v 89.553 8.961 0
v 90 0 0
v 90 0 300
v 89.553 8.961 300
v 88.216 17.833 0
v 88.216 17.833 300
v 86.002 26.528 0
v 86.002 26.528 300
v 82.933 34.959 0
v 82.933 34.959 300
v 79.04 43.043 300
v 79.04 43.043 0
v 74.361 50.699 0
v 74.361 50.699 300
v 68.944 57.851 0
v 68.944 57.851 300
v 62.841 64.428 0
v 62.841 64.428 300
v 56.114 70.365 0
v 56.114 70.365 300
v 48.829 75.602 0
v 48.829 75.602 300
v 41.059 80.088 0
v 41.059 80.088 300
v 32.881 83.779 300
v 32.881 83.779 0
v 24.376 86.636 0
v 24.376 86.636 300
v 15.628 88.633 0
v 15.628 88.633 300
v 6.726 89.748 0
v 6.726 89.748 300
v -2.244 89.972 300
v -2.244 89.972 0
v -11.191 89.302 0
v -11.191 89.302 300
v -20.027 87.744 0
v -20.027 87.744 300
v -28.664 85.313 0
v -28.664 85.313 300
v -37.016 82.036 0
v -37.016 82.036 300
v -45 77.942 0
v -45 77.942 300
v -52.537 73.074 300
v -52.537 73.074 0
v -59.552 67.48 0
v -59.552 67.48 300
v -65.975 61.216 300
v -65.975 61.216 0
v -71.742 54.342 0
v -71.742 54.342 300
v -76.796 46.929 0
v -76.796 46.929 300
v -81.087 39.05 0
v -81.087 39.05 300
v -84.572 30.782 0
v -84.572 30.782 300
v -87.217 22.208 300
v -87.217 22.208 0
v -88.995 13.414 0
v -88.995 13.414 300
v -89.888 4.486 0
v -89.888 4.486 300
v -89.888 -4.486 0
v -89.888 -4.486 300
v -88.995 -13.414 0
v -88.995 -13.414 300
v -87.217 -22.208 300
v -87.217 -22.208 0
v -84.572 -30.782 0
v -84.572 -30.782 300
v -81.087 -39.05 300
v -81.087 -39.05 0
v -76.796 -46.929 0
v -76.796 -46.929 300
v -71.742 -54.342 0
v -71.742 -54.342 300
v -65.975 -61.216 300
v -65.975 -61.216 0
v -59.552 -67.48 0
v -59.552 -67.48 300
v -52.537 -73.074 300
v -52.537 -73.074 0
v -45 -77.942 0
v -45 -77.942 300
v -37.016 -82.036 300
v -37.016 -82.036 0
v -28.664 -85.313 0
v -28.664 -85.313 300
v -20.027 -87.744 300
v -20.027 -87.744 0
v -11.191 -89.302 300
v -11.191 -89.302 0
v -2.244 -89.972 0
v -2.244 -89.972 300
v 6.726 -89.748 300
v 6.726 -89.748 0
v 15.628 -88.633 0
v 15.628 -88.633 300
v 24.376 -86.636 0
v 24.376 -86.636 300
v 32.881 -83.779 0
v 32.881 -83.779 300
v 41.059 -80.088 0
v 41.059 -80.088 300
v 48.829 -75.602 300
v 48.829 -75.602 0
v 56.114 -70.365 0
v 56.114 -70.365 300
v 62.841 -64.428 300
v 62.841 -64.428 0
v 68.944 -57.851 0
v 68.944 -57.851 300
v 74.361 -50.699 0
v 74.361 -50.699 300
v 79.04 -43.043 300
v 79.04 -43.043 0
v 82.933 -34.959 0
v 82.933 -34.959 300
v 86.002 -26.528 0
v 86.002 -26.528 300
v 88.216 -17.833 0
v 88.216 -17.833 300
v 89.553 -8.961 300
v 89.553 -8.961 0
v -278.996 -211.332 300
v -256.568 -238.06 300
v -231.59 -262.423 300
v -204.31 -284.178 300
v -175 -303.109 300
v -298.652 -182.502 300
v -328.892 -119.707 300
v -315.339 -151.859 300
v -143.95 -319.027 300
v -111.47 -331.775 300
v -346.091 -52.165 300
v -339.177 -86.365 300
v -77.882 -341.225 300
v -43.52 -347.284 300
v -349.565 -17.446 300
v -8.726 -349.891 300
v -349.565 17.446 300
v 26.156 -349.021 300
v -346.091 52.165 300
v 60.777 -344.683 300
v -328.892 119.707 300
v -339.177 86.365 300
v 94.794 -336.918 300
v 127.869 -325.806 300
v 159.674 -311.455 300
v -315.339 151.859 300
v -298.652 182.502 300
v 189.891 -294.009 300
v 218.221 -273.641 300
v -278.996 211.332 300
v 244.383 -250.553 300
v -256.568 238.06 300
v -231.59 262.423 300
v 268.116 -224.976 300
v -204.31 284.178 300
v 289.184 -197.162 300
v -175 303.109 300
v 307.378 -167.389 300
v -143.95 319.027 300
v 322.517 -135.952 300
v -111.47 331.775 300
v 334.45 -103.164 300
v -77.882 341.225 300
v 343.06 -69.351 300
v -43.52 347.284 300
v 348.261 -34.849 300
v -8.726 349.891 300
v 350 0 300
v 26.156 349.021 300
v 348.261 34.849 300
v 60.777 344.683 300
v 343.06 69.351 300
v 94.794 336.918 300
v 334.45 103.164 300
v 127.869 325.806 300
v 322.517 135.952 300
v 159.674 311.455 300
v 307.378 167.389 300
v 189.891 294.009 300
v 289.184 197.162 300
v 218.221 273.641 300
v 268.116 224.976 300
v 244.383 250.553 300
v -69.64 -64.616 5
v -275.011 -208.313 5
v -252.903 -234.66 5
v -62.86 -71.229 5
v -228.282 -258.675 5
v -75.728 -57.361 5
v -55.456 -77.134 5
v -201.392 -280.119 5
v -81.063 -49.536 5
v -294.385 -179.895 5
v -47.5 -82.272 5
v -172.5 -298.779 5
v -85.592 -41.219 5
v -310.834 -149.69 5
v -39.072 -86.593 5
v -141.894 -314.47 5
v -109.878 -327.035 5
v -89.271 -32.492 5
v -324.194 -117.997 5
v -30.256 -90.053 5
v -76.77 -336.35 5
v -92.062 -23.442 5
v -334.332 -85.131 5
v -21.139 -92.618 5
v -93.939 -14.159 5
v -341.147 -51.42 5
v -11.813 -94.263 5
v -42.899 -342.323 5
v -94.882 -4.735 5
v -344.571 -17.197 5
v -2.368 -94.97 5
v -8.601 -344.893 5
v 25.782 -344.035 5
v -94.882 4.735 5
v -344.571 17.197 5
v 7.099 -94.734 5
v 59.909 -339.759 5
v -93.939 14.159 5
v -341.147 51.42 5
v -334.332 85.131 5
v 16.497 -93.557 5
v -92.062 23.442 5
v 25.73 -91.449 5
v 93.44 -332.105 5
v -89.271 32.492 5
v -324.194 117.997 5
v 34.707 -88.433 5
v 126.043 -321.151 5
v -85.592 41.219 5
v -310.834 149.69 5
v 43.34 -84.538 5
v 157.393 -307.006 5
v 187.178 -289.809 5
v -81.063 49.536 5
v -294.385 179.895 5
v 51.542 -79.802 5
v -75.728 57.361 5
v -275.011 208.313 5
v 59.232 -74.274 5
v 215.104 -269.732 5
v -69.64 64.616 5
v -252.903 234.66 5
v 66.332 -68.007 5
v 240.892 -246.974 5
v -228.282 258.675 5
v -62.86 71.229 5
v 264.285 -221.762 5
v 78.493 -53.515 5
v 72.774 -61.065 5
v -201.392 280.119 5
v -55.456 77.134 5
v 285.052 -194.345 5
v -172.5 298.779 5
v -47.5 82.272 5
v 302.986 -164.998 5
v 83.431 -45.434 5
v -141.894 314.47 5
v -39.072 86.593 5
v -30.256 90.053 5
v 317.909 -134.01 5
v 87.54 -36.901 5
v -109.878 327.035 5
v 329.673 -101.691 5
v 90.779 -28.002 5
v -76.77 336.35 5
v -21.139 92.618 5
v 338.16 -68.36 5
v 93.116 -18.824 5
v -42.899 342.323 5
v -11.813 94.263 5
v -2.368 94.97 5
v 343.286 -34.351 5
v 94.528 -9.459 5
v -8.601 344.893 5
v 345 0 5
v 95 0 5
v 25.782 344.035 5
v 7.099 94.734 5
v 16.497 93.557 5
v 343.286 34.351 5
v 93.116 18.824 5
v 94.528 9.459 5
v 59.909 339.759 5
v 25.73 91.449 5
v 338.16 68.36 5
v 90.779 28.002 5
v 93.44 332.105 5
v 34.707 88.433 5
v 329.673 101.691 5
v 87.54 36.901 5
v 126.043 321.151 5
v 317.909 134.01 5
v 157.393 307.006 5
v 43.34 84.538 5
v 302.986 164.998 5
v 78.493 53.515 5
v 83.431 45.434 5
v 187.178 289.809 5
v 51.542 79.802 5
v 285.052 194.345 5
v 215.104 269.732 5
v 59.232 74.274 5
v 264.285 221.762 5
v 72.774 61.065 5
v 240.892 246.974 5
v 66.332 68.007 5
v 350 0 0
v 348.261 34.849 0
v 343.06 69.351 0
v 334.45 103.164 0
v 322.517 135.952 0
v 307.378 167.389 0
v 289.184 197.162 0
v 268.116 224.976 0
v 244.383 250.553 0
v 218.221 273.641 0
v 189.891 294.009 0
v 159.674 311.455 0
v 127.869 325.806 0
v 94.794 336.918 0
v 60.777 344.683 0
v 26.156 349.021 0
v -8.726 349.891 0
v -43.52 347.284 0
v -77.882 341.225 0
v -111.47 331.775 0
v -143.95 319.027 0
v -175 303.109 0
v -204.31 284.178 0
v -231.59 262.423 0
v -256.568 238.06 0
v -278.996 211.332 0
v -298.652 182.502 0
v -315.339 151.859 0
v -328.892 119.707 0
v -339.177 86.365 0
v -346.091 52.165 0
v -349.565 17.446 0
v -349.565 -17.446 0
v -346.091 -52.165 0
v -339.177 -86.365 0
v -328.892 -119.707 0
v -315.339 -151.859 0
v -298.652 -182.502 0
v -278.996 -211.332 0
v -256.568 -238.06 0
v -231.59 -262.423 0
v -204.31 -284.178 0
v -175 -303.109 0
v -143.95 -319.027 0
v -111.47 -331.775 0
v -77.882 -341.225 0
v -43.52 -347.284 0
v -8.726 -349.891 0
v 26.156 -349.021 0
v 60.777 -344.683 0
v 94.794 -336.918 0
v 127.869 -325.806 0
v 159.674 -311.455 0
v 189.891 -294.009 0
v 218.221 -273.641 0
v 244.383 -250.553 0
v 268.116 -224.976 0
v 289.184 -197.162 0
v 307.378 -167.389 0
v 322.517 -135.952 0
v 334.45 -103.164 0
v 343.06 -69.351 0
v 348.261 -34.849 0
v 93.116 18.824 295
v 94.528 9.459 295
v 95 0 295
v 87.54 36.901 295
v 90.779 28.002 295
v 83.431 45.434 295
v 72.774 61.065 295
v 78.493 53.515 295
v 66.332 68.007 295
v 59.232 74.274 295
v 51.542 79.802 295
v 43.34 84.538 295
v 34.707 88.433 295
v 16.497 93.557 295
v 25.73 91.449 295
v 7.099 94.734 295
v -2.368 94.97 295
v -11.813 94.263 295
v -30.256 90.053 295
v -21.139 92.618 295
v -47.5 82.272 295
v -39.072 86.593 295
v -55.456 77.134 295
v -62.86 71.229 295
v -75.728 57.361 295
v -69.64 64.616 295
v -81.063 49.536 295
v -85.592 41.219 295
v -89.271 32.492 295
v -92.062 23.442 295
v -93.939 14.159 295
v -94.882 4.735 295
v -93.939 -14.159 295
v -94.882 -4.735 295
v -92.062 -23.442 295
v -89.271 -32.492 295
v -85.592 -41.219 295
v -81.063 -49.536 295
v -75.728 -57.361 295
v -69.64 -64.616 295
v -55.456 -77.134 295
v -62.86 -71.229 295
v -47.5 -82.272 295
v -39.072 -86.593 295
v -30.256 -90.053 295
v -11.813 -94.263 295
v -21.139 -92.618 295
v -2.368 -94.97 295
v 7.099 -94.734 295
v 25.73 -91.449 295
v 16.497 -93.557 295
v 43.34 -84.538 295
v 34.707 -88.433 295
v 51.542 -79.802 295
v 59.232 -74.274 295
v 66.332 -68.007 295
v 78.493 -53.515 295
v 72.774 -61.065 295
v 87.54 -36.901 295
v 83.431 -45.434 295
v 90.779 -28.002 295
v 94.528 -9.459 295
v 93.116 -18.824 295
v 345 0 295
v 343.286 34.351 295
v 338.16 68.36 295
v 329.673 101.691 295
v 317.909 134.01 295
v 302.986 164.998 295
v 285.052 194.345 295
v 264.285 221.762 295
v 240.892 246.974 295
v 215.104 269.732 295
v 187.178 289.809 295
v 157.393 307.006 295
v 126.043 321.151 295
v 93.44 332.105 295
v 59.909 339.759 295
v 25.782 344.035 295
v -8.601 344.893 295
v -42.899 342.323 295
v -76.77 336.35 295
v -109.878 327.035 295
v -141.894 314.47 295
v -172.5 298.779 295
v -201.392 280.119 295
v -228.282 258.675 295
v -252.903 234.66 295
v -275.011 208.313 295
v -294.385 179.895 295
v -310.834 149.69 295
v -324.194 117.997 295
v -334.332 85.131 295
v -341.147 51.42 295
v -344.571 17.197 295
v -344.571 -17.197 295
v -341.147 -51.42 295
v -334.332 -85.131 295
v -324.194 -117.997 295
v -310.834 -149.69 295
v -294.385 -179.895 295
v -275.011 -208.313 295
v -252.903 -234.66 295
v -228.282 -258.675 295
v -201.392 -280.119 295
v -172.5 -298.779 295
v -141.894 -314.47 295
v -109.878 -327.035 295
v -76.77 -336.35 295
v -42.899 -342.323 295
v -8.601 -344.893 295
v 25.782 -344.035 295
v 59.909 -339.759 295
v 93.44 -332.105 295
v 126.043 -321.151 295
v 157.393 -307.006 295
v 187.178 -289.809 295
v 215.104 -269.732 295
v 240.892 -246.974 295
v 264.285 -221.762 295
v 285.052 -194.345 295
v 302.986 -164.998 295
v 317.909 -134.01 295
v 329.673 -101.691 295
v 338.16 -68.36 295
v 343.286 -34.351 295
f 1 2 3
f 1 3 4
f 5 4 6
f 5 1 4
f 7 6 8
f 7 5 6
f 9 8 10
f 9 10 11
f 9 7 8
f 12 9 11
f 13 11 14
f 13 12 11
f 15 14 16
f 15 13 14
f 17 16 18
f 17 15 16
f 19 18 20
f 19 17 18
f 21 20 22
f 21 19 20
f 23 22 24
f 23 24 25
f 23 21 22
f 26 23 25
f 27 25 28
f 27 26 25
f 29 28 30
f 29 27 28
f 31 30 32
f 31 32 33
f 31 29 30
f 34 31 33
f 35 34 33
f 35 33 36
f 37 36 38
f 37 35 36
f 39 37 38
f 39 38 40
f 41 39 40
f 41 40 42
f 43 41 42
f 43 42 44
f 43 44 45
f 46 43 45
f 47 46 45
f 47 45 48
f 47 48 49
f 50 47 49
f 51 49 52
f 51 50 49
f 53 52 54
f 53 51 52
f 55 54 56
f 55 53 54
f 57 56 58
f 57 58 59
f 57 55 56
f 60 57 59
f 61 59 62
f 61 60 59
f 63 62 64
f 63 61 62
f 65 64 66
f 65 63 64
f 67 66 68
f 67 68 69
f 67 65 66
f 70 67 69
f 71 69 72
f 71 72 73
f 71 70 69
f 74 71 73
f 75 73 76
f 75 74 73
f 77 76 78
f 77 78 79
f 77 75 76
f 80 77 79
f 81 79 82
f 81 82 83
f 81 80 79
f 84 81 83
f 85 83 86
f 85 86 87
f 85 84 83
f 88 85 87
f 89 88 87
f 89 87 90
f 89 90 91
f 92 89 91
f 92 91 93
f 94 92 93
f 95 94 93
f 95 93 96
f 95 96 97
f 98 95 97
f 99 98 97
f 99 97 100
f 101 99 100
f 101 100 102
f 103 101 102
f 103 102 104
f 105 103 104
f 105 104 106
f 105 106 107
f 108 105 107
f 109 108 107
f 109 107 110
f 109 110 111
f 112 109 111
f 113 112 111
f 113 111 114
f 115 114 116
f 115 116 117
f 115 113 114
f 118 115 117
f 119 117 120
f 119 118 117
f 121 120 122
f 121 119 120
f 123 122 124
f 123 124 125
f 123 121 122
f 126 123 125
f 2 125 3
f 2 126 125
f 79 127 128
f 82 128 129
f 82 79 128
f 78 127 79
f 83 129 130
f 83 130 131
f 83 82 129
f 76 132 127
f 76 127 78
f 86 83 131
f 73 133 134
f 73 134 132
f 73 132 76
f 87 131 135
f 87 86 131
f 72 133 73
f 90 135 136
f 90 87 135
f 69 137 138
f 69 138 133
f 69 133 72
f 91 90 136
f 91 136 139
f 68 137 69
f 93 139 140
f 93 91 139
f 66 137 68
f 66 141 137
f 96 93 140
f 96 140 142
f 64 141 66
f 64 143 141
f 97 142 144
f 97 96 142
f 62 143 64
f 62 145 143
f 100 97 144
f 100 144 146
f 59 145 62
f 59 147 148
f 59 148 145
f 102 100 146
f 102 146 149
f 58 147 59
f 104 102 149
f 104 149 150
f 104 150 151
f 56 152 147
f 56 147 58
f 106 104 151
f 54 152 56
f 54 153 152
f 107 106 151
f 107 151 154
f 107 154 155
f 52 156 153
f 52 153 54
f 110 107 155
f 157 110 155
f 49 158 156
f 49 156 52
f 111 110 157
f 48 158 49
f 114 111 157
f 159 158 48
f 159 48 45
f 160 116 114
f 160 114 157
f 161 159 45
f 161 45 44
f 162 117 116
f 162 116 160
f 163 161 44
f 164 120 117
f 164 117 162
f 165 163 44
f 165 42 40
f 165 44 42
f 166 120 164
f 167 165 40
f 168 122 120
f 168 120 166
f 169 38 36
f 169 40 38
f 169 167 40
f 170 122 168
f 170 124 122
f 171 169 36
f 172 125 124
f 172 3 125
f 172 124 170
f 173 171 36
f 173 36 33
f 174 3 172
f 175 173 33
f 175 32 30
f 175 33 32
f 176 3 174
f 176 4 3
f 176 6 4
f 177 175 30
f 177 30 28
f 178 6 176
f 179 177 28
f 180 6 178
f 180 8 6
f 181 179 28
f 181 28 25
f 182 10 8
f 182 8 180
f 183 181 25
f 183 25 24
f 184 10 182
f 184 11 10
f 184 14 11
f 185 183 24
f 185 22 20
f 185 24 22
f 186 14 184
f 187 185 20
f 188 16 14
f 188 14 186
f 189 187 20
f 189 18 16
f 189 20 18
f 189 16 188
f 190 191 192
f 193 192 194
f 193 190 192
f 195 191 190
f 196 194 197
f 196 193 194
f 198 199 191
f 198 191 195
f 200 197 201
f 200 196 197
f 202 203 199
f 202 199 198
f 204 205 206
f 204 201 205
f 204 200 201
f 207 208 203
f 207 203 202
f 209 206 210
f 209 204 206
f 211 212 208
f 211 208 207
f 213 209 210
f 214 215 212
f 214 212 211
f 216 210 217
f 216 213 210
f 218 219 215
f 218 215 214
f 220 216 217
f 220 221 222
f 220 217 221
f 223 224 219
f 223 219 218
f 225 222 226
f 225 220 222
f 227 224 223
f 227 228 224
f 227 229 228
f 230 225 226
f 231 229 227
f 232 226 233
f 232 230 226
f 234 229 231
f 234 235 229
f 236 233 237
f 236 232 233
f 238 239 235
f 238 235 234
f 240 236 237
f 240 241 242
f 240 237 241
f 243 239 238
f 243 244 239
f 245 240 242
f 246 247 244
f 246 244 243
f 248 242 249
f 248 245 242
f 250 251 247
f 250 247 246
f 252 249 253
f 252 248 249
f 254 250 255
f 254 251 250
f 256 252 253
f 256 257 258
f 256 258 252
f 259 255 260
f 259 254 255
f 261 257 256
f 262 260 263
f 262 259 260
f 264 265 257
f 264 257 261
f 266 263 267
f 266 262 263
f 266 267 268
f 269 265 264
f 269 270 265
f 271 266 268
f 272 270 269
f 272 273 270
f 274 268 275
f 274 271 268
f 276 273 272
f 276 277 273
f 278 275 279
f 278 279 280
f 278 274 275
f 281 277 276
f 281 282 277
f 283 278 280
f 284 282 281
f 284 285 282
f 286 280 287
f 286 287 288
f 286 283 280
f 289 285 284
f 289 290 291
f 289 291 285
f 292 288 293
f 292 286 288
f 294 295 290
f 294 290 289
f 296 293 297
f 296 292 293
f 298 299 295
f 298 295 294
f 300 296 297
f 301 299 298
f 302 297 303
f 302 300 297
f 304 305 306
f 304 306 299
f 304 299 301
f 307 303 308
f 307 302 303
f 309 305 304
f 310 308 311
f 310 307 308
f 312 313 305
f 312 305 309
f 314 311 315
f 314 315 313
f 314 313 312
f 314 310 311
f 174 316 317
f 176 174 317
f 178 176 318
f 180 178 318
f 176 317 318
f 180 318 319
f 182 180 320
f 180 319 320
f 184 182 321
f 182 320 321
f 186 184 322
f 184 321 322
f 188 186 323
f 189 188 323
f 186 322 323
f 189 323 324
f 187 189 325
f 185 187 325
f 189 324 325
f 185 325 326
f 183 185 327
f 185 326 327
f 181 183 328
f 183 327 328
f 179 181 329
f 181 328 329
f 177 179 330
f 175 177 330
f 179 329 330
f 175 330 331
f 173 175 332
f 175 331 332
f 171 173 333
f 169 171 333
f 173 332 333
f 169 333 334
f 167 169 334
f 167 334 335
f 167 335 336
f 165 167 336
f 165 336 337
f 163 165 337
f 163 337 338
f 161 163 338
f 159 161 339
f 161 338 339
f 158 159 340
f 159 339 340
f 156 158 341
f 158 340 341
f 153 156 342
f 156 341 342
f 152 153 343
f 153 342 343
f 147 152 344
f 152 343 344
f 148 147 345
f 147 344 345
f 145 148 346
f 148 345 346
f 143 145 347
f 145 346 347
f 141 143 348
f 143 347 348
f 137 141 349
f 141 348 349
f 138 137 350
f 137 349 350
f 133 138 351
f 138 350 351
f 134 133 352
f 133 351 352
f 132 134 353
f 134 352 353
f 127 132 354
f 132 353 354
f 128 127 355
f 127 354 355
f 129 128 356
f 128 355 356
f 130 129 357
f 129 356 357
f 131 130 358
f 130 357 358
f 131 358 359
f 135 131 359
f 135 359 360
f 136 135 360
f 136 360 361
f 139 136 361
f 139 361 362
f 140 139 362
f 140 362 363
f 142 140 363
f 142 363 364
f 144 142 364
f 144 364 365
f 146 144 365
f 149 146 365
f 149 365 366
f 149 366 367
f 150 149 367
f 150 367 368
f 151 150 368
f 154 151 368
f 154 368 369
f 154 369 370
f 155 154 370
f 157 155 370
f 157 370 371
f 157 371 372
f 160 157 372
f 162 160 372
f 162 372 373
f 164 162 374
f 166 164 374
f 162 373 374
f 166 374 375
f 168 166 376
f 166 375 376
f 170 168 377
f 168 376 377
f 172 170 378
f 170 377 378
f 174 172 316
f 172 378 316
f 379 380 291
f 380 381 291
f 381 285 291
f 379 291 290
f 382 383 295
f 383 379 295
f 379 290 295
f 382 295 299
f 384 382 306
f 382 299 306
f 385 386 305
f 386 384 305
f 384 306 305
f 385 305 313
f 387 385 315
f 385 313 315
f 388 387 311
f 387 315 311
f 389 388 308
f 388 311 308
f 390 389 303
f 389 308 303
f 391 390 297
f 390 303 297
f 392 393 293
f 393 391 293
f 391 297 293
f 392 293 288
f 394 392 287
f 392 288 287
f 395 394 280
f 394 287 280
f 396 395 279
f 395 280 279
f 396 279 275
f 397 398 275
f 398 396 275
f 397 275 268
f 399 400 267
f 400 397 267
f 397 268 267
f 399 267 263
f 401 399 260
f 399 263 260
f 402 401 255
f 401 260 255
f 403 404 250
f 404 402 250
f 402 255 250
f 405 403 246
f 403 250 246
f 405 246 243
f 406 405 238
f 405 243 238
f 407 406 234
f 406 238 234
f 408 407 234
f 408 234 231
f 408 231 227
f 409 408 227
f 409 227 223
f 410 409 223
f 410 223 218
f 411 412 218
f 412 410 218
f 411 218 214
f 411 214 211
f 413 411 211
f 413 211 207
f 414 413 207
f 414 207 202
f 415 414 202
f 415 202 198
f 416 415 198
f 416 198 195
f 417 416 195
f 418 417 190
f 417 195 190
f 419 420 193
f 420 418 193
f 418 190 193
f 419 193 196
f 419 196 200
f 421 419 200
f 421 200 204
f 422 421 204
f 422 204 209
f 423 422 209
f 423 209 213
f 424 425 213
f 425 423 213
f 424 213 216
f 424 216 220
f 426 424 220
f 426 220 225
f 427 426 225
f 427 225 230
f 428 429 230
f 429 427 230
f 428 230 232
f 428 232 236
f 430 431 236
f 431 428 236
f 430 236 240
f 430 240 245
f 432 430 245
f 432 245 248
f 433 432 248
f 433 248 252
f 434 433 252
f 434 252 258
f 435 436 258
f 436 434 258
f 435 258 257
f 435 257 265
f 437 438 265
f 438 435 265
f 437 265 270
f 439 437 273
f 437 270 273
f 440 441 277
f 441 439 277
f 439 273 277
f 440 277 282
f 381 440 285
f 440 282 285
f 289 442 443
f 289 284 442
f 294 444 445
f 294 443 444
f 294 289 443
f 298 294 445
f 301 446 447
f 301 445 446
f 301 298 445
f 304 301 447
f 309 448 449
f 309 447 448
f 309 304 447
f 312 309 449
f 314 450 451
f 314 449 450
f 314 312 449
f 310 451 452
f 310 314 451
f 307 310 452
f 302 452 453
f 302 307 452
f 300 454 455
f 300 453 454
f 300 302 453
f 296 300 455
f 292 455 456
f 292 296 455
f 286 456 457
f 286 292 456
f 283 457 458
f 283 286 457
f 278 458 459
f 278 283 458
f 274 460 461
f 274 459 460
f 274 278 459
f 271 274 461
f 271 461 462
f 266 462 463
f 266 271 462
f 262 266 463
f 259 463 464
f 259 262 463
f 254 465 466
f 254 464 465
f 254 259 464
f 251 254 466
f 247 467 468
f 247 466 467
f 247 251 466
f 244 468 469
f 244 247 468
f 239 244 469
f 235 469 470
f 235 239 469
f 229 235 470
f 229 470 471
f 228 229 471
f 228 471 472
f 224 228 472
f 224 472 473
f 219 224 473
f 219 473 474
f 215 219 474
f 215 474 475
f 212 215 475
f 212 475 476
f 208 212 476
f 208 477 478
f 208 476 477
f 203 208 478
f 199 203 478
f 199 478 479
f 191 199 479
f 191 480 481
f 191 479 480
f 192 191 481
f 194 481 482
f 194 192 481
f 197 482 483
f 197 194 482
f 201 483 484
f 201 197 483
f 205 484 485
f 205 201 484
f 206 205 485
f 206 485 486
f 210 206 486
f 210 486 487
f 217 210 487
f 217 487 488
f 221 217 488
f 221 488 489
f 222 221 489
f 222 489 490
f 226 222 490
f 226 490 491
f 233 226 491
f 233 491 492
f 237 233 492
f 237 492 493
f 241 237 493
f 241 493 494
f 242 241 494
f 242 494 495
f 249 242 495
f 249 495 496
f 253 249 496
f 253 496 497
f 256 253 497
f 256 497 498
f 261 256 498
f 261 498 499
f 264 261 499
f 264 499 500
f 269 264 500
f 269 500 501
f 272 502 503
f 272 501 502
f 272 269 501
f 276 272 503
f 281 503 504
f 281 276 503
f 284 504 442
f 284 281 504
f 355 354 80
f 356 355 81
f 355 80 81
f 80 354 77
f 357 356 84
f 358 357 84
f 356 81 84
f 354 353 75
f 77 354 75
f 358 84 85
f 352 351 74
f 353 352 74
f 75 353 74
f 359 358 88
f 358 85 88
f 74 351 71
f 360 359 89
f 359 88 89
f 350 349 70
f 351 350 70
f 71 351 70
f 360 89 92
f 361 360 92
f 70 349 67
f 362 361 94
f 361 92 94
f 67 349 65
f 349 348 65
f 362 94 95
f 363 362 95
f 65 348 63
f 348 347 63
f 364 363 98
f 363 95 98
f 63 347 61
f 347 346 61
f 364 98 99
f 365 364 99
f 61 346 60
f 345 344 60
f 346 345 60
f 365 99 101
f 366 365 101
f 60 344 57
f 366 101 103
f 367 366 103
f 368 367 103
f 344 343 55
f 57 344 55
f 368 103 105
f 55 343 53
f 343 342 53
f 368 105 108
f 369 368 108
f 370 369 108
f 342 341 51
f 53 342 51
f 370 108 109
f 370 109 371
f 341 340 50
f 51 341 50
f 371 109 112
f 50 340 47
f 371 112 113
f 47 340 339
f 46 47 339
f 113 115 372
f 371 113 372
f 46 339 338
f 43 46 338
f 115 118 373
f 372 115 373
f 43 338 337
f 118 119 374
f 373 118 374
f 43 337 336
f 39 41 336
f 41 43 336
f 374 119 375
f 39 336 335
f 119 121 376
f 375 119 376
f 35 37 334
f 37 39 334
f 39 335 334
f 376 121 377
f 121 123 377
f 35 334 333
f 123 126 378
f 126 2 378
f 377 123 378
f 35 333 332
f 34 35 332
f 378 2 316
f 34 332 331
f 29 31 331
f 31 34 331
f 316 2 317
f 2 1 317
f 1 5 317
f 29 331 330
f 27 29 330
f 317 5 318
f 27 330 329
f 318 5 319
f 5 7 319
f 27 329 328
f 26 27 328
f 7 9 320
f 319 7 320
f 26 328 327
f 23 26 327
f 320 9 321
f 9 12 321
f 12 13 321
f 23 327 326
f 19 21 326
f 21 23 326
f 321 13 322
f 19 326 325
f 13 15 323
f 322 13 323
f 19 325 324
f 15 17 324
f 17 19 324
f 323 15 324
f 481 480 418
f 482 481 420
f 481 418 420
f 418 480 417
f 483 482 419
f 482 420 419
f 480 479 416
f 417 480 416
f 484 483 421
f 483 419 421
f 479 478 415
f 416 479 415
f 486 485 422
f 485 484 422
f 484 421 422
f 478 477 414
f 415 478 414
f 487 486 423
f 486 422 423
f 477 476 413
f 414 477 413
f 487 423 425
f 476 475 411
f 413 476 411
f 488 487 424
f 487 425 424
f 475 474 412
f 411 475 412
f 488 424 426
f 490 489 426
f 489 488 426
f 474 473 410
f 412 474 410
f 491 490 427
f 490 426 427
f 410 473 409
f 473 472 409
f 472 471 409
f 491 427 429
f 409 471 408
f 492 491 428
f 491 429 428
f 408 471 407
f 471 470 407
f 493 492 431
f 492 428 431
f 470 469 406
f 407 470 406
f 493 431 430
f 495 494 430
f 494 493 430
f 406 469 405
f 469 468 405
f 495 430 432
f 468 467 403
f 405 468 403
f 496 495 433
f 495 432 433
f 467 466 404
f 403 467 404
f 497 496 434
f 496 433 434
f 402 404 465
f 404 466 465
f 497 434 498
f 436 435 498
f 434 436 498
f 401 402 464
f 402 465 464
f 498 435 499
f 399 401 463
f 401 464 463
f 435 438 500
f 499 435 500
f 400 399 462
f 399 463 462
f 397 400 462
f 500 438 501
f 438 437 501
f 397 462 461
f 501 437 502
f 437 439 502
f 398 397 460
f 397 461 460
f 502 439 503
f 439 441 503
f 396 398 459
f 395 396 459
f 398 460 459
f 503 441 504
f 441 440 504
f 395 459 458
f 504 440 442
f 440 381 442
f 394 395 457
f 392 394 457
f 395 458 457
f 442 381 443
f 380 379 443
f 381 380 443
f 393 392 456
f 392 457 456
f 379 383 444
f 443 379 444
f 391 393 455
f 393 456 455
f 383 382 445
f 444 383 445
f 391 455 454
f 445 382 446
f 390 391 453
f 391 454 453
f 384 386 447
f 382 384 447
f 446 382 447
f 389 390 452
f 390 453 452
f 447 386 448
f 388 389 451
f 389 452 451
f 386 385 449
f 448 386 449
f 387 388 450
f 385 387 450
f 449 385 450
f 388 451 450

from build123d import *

# Parameters (mm, degrees)
SKETCH1_R           = 350
SKETCH1_R_2         = 90
BOSS_EXTRUDE1_DEPTH = 300
SHELL1_T            = 5


with BuildPart() as part:
    # Sketch1 → Boss-Extrude1 (new body)
    with BuildSketch(Plane.XY):
        Circle(SKETCH1_R)
        Circle(SKETCH1_R_2, mode=Mode.SUBTRACT)
    extrude(amount=BOSS_EXTRUDE1_DEPTH)

    # Shell1 (no face opened: a closed hollow body)
    add(offset(amount=-SHELL1_T, mode=Mode.PRIVATE), mode=Mode.SUBTRACT)


solid = part.part
